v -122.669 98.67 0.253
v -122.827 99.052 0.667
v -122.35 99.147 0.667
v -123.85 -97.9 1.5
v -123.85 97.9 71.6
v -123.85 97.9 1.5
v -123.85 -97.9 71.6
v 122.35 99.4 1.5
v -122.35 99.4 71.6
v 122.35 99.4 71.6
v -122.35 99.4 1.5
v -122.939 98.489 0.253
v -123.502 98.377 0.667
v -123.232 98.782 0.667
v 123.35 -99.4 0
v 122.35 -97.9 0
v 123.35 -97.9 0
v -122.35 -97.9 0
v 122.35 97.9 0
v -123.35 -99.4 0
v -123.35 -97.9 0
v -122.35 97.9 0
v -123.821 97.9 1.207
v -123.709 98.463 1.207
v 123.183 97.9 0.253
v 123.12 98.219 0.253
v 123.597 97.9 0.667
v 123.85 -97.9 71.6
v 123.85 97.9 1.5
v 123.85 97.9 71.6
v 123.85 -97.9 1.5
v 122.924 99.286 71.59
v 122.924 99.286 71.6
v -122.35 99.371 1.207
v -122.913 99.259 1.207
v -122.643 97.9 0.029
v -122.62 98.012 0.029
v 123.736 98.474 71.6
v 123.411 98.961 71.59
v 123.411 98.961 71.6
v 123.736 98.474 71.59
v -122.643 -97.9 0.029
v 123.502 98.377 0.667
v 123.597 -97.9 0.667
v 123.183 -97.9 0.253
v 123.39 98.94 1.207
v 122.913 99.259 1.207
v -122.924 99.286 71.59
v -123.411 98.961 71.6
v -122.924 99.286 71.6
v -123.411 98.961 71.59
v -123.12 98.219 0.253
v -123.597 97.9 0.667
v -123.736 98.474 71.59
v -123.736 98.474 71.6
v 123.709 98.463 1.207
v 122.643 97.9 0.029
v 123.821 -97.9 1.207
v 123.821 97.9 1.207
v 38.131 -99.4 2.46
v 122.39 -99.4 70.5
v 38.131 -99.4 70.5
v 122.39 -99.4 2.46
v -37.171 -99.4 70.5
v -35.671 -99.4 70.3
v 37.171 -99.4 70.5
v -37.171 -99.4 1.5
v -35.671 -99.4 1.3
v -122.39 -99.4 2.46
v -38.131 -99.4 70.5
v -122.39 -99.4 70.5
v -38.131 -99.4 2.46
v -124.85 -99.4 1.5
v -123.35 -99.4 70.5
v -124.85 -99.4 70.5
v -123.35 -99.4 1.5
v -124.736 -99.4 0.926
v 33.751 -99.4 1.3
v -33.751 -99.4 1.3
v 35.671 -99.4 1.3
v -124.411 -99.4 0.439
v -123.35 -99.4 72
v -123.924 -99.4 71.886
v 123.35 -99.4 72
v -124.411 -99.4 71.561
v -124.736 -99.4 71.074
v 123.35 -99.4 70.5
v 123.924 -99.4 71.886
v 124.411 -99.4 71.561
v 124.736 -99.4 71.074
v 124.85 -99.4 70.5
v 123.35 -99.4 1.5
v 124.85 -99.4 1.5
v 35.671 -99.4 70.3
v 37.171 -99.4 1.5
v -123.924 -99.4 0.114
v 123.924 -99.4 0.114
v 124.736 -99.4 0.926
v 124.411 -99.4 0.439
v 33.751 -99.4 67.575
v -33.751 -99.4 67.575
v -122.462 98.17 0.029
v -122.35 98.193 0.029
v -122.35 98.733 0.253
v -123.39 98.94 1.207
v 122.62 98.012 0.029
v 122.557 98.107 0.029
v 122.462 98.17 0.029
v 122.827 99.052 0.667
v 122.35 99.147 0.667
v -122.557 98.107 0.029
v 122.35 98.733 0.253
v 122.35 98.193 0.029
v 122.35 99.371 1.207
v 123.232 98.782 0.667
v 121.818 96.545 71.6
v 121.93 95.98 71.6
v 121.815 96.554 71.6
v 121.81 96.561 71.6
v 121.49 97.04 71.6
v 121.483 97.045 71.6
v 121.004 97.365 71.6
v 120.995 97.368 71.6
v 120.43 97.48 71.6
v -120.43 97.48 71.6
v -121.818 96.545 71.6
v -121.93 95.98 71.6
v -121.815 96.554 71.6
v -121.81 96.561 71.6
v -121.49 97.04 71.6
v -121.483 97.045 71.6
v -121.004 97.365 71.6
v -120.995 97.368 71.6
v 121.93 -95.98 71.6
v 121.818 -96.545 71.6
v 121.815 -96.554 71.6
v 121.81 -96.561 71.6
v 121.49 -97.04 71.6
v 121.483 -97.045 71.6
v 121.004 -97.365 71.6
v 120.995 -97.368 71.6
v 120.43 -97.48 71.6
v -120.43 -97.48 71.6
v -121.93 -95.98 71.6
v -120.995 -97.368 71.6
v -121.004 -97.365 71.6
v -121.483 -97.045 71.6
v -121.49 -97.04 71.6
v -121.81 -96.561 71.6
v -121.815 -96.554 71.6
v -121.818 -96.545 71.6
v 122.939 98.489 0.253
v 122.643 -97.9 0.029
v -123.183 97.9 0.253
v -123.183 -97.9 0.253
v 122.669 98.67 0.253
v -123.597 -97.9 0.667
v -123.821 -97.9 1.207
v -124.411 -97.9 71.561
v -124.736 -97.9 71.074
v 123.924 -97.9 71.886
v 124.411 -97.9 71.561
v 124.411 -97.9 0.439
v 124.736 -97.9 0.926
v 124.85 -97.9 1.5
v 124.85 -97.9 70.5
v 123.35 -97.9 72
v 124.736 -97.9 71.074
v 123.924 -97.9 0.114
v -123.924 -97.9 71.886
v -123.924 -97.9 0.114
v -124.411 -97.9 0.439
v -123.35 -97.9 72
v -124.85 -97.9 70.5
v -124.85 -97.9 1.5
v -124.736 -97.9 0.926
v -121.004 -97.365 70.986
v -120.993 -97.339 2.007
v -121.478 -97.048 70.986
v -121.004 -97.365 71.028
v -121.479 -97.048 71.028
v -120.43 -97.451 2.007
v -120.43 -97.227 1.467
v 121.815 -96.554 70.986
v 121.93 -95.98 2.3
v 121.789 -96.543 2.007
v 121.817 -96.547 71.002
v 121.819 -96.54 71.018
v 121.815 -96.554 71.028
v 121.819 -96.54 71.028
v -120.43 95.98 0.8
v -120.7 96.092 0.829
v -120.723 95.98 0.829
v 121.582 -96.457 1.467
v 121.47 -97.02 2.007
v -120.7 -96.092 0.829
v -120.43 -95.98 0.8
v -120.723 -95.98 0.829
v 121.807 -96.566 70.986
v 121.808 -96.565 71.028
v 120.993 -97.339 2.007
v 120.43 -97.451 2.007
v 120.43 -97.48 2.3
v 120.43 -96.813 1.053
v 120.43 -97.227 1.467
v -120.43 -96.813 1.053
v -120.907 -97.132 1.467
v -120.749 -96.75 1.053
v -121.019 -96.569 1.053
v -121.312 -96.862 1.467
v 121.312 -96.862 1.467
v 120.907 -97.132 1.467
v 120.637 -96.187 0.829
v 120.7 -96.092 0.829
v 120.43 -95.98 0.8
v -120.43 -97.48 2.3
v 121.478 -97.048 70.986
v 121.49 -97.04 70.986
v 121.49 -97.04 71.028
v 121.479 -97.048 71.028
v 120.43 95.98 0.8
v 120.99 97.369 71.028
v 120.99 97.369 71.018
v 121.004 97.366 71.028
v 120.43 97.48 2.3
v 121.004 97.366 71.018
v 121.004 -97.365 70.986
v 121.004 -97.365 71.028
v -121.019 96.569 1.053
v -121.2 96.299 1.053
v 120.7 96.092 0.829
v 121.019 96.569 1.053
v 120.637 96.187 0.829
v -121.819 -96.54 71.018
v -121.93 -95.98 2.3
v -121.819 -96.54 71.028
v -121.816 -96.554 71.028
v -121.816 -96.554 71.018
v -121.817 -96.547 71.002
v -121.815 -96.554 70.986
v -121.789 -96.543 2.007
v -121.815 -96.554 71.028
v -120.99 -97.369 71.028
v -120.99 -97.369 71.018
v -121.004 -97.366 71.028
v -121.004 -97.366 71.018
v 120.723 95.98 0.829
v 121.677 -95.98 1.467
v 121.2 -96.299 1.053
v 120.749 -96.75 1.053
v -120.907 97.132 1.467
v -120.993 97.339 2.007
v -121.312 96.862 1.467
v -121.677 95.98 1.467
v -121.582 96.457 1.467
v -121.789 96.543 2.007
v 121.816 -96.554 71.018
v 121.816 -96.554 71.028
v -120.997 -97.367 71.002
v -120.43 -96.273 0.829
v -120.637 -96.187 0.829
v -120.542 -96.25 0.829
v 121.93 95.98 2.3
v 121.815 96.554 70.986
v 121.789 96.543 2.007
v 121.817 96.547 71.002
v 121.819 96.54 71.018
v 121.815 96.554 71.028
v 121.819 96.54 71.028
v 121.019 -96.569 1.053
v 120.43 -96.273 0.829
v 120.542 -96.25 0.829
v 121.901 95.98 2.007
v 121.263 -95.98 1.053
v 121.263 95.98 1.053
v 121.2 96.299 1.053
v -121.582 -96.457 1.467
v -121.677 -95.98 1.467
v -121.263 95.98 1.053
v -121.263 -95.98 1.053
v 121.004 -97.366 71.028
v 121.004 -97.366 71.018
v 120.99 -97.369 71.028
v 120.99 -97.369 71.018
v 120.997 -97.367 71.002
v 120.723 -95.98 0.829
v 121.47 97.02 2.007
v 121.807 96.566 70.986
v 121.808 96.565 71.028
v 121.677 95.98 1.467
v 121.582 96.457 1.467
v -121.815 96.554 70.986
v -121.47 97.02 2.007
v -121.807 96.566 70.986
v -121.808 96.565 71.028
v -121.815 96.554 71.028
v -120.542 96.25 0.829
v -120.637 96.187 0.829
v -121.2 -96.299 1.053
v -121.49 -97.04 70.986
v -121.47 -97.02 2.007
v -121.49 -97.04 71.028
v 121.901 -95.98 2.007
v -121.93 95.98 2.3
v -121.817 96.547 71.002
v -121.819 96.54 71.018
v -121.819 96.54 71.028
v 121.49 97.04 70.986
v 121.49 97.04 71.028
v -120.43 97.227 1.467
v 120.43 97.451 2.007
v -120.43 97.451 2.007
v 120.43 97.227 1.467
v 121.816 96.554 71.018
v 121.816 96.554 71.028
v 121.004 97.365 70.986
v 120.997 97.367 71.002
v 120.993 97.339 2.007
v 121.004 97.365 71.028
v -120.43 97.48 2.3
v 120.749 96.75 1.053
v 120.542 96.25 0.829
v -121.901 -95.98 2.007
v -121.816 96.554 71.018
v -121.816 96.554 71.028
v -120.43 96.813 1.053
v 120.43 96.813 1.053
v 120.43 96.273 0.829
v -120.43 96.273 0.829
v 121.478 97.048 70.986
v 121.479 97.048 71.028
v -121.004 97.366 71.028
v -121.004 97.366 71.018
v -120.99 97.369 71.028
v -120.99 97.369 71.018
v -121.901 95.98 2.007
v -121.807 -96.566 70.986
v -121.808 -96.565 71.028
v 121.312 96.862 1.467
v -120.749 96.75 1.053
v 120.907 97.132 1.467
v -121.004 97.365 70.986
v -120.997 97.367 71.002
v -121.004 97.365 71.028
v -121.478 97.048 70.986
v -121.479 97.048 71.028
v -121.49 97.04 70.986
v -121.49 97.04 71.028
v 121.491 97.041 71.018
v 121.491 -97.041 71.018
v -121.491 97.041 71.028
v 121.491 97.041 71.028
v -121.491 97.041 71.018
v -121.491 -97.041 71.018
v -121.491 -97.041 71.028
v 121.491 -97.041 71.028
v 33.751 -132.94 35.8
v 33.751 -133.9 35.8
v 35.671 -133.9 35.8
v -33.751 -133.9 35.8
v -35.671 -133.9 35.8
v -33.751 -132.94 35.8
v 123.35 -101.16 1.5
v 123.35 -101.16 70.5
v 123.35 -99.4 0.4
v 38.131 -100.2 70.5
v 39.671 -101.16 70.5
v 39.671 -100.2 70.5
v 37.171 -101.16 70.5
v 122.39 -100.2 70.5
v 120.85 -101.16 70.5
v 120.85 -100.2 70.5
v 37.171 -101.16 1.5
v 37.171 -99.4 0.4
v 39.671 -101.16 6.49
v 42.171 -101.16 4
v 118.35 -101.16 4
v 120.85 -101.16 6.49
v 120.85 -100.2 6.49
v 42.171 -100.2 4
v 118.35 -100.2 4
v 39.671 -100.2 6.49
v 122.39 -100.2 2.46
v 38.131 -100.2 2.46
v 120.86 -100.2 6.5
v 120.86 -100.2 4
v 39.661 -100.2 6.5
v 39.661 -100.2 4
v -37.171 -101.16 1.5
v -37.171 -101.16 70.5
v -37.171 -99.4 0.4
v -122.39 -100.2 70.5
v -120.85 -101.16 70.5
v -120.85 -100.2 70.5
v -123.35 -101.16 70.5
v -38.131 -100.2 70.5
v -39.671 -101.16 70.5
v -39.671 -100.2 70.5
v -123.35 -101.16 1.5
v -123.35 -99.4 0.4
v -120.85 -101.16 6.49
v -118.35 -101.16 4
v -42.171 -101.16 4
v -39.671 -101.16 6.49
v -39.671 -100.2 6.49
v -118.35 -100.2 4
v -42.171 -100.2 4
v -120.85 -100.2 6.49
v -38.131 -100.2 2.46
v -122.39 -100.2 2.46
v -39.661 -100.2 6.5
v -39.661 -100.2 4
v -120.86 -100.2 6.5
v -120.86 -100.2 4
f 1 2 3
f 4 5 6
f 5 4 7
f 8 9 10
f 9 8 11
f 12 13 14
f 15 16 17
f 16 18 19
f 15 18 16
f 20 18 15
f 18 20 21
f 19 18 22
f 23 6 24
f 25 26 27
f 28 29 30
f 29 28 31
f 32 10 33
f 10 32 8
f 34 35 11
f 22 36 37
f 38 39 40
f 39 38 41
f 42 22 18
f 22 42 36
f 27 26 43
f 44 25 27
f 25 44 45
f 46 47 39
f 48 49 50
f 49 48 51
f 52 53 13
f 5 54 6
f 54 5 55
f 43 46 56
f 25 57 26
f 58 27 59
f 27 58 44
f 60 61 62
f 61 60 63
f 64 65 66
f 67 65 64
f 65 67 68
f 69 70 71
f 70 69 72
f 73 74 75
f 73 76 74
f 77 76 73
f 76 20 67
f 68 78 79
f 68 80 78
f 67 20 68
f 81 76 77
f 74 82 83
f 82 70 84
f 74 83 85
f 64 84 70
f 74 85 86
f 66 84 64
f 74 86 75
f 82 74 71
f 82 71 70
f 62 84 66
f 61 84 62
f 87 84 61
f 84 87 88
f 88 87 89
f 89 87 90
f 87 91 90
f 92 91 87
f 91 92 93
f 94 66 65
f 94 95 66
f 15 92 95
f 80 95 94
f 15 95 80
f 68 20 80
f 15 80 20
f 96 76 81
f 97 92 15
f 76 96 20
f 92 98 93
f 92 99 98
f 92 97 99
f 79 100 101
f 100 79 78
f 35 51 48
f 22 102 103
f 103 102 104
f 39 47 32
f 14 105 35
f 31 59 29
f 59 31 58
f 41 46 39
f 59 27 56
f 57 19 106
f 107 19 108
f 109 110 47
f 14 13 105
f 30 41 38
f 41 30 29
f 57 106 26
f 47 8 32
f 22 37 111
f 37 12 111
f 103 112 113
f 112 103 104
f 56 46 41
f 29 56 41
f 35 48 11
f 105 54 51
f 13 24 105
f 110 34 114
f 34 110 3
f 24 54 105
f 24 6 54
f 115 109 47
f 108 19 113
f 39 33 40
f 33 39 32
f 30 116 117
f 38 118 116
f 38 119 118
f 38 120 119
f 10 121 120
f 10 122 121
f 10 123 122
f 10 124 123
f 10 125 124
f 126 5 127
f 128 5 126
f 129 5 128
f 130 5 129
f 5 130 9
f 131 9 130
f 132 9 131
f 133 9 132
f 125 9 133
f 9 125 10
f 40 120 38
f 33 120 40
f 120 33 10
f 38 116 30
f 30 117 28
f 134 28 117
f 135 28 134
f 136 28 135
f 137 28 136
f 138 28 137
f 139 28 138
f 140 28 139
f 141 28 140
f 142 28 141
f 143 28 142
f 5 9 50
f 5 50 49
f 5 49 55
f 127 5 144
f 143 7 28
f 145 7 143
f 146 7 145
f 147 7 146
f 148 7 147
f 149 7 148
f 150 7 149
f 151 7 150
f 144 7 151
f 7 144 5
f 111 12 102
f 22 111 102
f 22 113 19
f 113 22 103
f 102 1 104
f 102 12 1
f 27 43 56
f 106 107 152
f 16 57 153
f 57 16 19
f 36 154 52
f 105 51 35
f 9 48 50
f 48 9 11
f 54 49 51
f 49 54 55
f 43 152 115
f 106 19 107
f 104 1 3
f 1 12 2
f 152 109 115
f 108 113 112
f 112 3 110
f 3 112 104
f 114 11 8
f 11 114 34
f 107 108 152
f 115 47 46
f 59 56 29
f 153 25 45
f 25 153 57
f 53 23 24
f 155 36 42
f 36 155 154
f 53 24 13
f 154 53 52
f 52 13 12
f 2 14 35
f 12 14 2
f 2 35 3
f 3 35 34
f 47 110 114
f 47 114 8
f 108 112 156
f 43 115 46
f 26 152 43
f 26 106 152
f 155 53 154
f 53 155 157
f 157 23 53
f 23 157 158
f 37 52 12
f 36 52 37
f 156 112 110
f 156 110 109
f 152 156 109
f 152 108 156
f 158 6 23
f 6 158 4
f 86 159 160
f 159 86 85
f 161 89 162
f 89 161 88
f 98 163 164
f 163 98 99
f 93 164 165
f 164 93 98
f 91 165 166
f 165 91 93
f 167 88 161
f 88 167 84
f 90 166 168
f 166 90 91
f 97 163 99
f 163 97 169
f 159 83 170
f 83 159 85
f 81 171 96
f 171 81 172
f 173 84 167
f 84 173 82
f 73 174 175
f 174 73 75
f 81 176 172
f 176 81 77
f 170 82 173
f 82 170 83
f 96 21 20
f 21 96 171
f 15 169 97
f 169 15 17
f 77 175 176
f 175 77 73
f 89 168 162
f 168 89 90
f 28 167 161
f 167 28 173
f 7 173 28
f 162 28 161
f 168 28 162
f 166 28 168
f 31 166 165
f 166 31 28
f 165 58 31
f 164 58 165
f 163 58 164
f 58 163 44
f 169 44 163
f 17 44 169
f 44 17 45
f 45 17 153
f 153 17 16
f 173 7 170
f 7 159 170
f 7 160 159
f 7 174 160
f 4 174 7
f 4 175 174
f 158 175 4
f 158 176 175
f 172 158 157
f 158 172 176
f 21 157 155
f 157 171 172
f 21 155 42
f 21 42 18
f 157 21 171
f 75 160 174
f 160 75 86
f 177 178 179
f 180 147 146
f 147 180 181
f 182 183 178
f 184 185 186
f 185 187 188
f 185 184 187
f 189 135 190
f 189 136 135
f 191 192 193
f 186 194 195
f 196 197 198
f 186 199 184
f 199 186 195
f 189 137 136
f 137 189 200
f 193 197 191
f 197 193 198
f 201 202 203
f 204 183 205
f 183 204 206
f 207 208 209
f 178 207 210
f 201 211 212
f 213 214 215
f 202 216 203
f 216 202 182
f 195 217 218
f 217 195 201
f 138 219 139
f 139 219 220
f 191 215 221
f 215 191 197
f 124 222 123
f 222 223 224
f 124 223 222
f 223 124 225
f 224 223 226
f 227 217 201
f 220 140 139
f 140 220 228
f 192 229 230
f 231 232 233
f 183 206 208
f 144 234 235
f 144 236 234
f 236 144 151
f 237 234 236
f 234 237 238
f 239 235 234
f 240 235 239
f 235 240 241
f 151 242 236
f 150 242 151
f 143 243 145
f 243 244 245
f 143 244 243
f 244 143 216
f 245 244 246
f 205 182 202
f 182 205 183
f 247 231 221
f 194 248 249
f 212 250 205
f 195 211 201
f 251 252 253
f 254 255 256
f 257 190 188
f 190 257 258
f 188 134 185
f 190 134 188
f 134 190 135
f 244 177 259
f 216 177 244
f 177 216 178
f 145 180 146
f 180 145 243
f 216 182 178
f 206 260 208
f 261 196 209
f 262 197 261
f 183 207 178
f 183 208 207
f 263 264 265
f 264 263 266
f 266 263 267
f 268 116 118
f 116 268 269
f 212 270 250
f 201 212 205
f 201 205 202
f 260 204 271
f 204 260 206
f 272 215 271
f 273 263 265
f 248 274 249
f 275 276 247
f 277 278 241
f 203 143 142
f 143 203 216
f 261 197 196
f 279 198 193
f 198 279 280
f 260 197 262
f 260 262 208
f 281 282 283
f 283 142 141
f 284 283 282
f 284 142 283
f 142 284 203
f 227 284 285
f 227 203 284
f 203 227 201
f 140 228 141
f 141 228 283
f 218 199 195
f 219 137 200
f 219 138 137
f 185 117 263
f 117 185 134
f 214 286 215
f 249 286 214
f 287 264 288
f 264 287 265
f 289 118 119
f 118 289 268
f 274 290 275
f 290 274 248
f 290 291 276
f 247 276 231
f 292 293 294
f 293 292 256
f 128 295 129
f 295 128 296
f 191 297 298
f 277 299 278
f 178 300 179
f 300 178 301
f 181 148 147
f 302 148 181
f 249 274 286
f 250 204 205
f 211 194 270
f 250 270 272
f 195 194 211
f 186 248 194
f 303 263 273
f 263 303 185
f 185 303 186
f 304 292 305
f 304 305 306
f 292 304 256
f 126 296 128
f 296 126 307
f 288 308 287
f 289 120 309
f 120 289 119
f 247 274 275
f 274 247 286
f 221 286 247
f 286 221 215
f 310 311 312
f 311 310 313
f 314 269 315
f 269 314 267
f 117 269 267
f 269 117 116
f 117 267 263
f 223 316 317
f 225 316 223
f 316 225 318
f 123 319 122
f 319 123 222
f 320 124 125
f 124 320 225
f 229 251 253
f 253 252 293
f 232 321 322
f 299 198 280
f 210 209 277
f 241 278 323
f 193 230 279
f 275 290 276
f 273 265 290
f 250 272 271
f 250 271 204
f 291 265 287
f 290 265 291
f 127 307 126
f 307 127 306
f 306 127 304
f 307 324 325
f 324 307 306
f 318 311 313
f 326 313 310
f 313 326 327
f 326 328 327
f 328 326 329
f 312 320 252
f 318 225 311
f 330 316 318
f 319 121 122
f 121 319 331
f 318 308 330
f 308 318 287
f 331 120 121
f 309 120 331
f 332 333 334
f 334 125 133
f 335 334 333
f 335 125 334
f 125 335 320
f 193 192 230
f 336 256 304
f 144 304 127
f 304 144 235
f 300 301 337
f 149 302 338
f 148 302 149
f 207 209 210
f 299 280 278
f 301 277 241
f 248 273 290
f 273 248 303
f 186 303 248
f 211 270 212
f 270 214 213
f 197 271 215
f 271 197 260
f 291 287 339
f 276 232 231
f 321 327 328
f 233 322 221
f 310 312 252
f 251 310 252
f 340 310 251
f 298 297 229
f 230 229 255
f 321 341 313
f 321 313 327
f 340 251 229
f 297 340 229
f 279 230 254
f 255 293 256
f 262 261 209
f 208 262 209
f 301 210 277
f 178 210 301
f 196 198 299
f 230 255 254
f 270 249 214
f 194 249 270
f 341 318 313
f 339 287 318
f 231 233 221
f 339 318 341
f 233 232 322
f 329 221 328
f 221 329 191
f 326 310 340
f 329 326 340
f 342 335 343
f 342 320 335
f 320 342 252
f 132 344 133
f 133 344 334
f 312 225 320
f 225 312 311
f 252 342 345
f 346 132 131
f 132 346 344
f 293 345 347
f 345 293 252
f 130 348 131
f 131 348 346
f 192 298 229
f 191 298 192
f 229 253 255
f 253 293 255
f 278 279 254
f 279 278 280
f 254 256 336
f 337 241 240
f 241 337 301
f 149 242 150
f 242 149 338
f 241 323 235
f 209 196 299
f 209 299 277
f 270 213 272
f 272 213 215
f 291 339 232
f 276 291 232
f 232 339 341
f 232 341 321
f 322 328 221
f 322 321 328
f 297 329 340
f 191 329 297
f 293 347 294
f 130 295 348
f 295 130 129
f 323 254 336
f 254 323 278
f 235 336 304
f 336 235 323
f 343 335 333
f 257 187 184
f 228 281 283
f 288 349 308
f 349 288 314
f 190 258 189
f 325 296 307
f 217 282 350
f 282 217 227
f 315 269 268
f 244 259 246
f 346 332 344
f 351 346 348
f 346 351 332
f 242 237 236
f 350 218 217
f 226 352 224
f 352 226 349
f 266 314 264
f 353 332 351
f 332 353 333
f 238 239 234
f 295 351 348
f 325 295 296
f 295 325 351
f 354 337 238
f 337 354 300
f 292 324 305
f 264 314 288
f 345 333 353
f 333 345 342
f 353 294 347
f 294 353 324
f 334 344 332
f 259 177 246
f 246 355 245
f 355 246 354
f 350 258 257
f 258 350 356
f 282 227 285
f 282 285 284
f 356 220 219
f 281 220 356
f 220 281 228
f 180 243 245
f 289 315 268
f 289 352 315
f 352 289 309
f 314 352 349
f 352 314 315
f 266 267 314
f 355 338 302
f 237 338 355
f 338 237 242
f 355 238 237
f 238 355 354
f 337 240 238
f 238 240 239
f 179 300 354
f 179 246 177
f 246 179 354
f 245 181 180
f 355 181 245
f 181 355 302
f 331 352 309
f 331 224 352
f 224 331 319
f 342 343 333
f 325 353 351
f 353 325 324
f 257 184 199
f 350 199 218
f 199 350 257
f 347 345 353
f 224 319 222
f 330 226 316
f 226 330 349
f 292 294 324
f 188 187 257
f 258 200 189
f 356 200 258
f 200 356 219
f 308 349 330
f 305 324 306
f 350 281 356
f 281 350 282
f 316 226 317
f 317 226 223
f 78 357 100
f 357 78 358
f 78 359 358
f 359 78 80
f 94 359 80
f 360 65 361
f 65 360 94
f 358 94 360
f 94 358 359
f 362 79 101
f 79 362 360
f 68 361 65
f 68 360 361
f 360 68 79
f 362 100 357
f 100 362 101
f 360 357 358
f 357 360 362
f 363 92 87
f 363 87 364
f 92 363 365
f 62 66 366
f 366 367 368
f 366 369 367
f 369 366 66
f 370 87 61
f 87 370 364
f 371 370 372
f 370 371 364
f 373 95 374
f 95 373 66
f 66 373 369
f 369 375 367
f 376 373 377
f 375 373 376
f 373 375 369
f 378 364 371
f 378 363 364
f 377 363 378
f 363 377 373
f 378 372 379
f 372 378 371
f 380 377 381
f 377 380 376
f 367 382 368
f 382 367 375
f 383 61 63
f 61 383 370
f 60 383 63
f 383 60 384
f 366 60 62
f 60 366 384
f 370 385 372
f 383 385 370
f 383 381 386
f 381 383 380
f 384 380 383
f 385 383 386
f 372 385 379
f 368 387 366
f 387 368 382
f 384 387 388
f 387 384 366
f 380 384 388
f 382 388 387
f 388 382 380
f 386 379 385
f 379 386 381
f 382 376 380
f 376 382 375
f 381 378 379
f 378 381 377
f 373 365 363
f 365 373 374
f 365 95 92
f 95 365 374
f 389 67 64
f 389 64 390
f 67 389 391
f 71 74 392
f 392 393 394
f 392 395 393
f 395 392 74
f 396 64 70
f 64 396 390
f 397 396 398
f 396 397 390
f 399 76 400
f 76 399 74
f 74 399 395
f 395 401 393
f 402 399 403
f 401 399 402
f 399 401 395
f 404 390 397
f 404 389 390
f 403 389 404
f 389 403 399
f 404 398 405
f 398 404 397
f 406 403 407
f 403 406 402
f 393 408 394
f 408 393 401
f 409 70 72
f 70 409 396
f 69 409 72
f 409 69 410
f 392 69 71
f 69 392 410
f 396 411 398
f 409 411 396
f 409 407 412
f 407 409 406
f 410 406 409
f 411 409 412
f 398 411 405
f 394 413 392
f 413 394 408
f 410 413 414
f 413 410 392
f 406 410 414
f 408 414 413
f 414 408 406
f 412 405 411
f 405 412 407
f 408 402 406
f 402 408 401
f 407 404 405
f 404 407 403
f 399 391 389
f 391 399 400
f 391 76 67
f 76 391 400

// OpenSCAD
//STACKABLE RESISTOR STORAGE BOX [Customizable]
//Created by Bram Vaessen 2018

// preview[view:south, tilt:top diagonal]

// Which one would you like to see?
// part = "middleMiddle";
part = "customDrawer";
// part = "info";
// part = "customDrawer"; //[single:Single Box <no stacking>), drawer: Drawer, customDrawer: Custom Drawer, topLeft:Box Top Left, topMiddle:Box Top Middle, topRight:Box Top Right, middleLeft:Box Middle Left, middleMiddle:Box Middle Middle, middleRight:Box Middle right, bottomLeft:Box Bottom Left, bottomMiddle:Box Bottom Middle, bottomRight:Box Bottom Right,  topSC:Box Top <Single Column Stacking>, middleSC:Box Middle <Signle Column Stacking>, bottomSC:Box Bottom <Signle Column Stacking>, leftSR:Box Left <Single Row Stacking>, middleSR:Box Middle <Single Row Stacking>, rightSR:Box Right <Single Row Stacking>, connector:Connector <for stacking>, info:INFO <Show Box/Drawer/Label sizes>]


/* [Basic Setup] */
//The width (mm) of a single compartment in a drawer (ignored with 'Custom Sized Box')
compartWidth = 25;
//The depth (mm) of a single compartment in a drawer (ignored with 'Custom Sized Box')
compartDepth = 62;
//The height (mm) of a single compartment in a drawer (ignored with 'Custom Sized Box')
compartHeight = 34-.2;

//The number of compartments in the drawer next to each other
compartXCount = 2;
//The numberof compartments in the drawer behind each other
compartYCount = 2;

//The number of drawers on top of each other
drawRows = 3;
//The number of columns of drawers next to eachother
drawCols = 1;

//The style of the handle on the drawers
handleStyle = 0; //[0:Normal, 1:Thin Handle]

//Add holes to the back of the box for mounting it on a wall or panel?
mountHoles=0; //[0:No, 1:Yes]


/* [Custom Drawer] */
//The number of compartments in the drawer next to each other (custom drawer)
cdrawXCount=1;
//The number of compartments in the drawer behind each other (custom drawer)
cdrawYCount=1;

/* [Custom Sized Box] */
//Provide a custom size for the box? Overrides/ignores compartment size!
useCustomBox = 1; //[0:No, 1:Yes]
//the width (mm) of the box
customBoxWidth = 255;
//the depth (mm) of the box
customBoxDepth = 200;
//the height (mm) of the box
customBoxHeight = 75 * 3;

/* [Tolerances] */
//the amount of extra space (mm) on the side of the drawers, on each side (reprint box after changing, unless using 'custom sized box', then reprint drawer)
drawHorSpace = 0.25;
//the amount of extra space (mm) on top and bottom of drawers, on each side (reprint box after changing, unless using 'custom sized box', then reprint drawer)
drawVertSpace = 0.35;
//the amount of extra space (mm) on the behind the drawer (reprint box after changing, unless using 'custom sized box', then reprint drawer)
drawBackSpace = 0.2;
//the amount  (mm) to shrink the drawer in height and width to fit more easily (reprint drawer after changing). TOLERANT drawers use 0.2mm.
drawShrink = 0.0;


/* [Your Printer Settings] */
//the layer width that you print with (0.48 is normal for 0.4 nozzle)
layerWidth=0.48;
//the layer height that you print with 
layerHeight=0.2;


///////////////////////////////////////////////////


/* [Hidden] */
grooveHeight = 5;
grooveDepth = 1* layerWidth;
smoothRadius=1.5;
smoothQuality=16;

boxColumnSpace = layerWidth*2;

drawDividerWidth = 2*layerWidth;
drawOutsideWidth = 4*layerWidth;
drawBottomHeight = 4*layerHeight;

drawFrontExtraWidth=1;
drawFrontExtraHeight = 2*layerHeight;

drawFrontExtra = max(0, smoothRadius - drawOutsideWidth);

boxOutsideWidth = 5*layerWidth;
boxDividerWidth = 2*layerWidth;
boxBackDepth = (mountHoles==1)?CorrectedHeight(3):CorrectedHeight(1);


//if custom box size, reverse calculations
customBoxColumnWidth = (customBoxWidth +boxOutsideWidth*(drawCols-1) -  boxOutsideWidth + boxDividerWidth)/drawCols;
customBoxDrawSpaceX = customBoxColumnWidth - drawFrontExtraWidth*2 - boxOutsideWidth - boxColumnSpace;

customBoxDrawSpaceY = customBoxDepth - boxBackDepth - drawFrontExtra;
customBoxDrawSpaceZ = (customBoxHeight - boxOutsideWidth*2)/drawRows - boxDividerWidth;

customDrawWidth = customBoxDrawSpaceX - drawHorSpace*2;
customDrawDepth = customBoxDrawSpaceY - drawBackSpace;
customDrawHeight = customBoxDrawSpaceZ - drawVertSpace*2;

customCompartWidth = (customDrawWidth - drawOutsideWidth*2 - drawDividerWidth*(compartXCount-1)) / compartXCount;
customCompartDepth = (customDrawDepth - drawOutsideWidth*2 -drawDividerWidth*(compartYCount-1))/compartYCount;
customCompartHeight = customDrawHeight-drawBottomHeight;

compartWidthF = useCustomBox ? customCompartWidth : compartWidth;
compartDepthF = useCustomBox ? customCompartDepth : compartDepth;
compartHeightF = useCustomBox ? customCompartHeight : compartHeight;


drawWidth = drawOutsideWidth*2 + drawDividerWidth*(compartXCount-1) + compartWidthF*compartXCount;
drawDepth = drawOutsideWidth*2 + drawDividerWidth*(compartYCount-1) + compartDepthF*compartYCount;

//check differences between desired drawer height and corrected drawer height and add to spacer
drawHeight = CorrectedHeightDown(drawBottomHeight + compartHeightF);
drawHeightU = drawBottomHeight + compartHeightF;
drawHeightD = (drawHeightU - drawHeight) / 2;
drawVertSpaceC = drawVertSpace+drawHeightD;




boxDrawSpaceX = drawWidth + drawHorSpace*2;
boxDrawSpaceY = drawDepth + drawBackSpace;
boxDrawSpaceZ = drawHeight + drawVertSpaceC*2;

boxColumnWidth = boxDrawSpaceX + drawFrontExtraWidth*2 + boxOutsideWidth + boxColumnSpace;

boxWidth = boxColumnWidth * drawCols - boxOutsideWidth*(drawCols-1) + boxOutsideWidth - boxDividerWidth;
boxDepth = CorrectedHeight(boxBackDepth + boxDrawSpaceY + drawFrontExtra);
boxHeight = drawRows*(boxDrawSpaceZ + boxDividerWidth)+ boxOutsideWidth*2;




////



drawFrontWidth = drawWidth + drawFrontExtraWidth*2;
drawFrontHeight = drawHeight + drawFrontExtraHeight;

handleWidth = lerp(max(15,drawFrontWidth/3.5), drawFrontWidth/12, handleStyle);
handleHeight1 = min(drawFrontHeight - smoothRadius*2,handleWidth) ;
handleHeight2 = drawFrontHeight - smoothRadius*2;
handleHeight = handleStyle ? handleHeight2 : handleHeight1;


handleDepth = handleHeight*0.5;
handleThickness = layerWidth*4;

labelFrameWidth = (drawFrontWidth - handleWidth - smoothRadius*4)/2;
labelFrameHeight = drawFrontHeight - smoothRadius*2;
labelFrameDist = -drawFrontWidth / 2 + smoothRadius + labelFrameWidth/2;
labelFrameThickness = 2*layerWidth;
labelFrameEdgeSize = 2.5;
labelFrameSpace = 0.8;
labelFrameDepth = labelFrameThickness+labelFrameSpace;

connectorWidth = 4;
connectorMid = 3* layerHeight;
connectorSide = 5*layerHeight;
connectorLength = boxDepth/3*2;
connectorSpacer = 0.35;
connectorDist = 0.5/5*3.25;

stopperDepth = CorrectedHeight(1.5);
stopperSteps = stopperDepth / layerHeight;
stopperHeight = layerWidth*stopperSteps*0.8;
stopperWidth = stopperHeight*1.5;
stopperStart = 2;



mountholeSize1=4;
mountholeSize2=8;
mountholeDepth1 = 2.5;
mountholeDepth2 = 5;

print_part();

module print_part()
{
	if (part == "single") 
        rotate([-90,0,0]) Box();
    if (part == "drawer") 
        Drawer();
    if (part == "customDrawer")
        CustomDrawer();
    if (part == "topLeft") 
        rotate([-90,0,0]) Box(boxRight="connector", boxBottom="connector");
    if (part == "topMiddle") 
        rotate([-90,0,0]) 
            Box(boxLeft="connector", boxRight="connector", boxBottom="connector");
    if (part == "topRight") 
        rotate([-90,0,0]) Box(boxLeft="connector", boxBottom="connector");
    if (part == "middleLeft") 
        rotate([-90,0,0]) 
            Box(boxRight="connector", boxBottom="connector", boxTop="connector");
    if (part == "middleMiddle") 
        rotate([-90,0,0]) 
            Box(boxLeft="connector", boxRight="connector", 
                boxBottom="connector", boxTop="connector");
    if (part == "middleRight") 
        rotate([-90,0,0]) 
            Box(boxLeft="connector", boxBottom="connector", boxTop="connector");
    if (part == "bottomLeft") 
        rotate([-90,0,0]) Box(boxRight="connector", boxTop="connector");
    if (part == "bottomMiddle") 
        rotate([-90,0,0]) 
            Box(boxLeft="connector", boxRight="connector", boxTop="connector");
    if (part == "bottomRight") 
        rotate([-90,0,0]) 
            Box(boxLeft="connector", boxTop="connector");
    if (part == "topSC")
        rotate([-90,0,0]) Box(boxBottom="connector");
    if (part == "middleSC")
        rotate([-90,0,0]) Box(boxBottom="connector", boxTop="connector");
    if (part == "bottomSC")
        rotate([-90,0,0]) Box(boxTop="connector");
    if (part == "leftSR")
        rotate([-90,0,0]) Box(boxRight="connector");
    if (part == "middleSR")
        rotate([-90,0,0]) Box(boxLeft="connector", boxRight="connector");
    if (part == "rightSR")
        rotate([-90,0,0]) Box(boxLeft="connector");
    if (part == "connector")
        rotate([-90,0,0]) Connector();
    if (part == "info")
        Info();
}      


module Info()
{
    
    linear_extrude(height=0.2) union()
    {
        text(str("Box Size (mm): ",boxWidth, ", ",boxDepth,", ", boxHeight));
        translate([0,-20,0])
            text(str("Drawer Size (mm): ", drawWidth,", ", drawDepth,", ",drawHeight));
        translate([0,-40,0])
            text(str("Label Size (mm): ", labelFrameWidth-labelFrameThickness*2-1,", ", labelFrameHeight-labelFrameThickness-1));
        translate([0,-60,0])
            text(str("Compartment Size (mm): ", compartWidthF,", ", compartDepthF,", ",compartHeightF));
        
    }
}


module Connector()
{
    linear_extrude(height=connectorLength-5)
        polygon(points=[
            [-connectorWidth/2+connectorSpacer, -connectorMid],
            [-connectorWidth/2+connectorSpacer, connectorMid],
            [-connectorWidth/2 -connectorSide +connectorSpacer, connectorMid+connectorSide],
            [connectorWidth/2 + connectorSide -connectorSpacer, connectorMid+connectorSide],
            [connectorWidth/2 - connectorSpacer,  connectorMid],
            [connectorWidth/2 - connectorSpacer, -connectorMid],
            [connectorWidth/2 + connectorSide - connectorSpacer, -connectorMid-connectorSide],
            [-connectorWidth/2 - connectorSide + connectorSpacer, -connectorMid-connectorSide],
            ]);
    
        translate([0,0,connectorLength-5])
        linear_extrude(height=5, scale=[0.75, 1])
        polygon(points=[
            [-connectorWidth/2+connectorSpacer, -connectorMid],
            [-connectorWidth/2+connectorSpacer, connectorMid],
            [-connectorWidth/2 -connectorSide +connectorSpacer, connectorMid+connectorSide],
            [connectorWidth/2 + connectorSide -connectorSpacer, connectorMid+connectorSide],
            [connectorWidth/2 - connectorSpacer,  connectorMid],
            [connectorWidth/2 - connectorSpacer, -connectorMid],
            [connectorWidth/2 + connectorSide - connectorSpacer, -connectorMid-connectorSide],
            [-connectorWidth/2 - connectorSide + connectorSpacer, -connectorMid-connectorSide],
            ]);
            
        for (z=[6,connectorLength-6])

        translate([0,0,z])
            linear_extrude(height=1)
                polygon(points=[
                    [-connectorWidth/2+connectorSpacer, -connectorMid],
                    [-connectorWidth/2+connectorSpacer, connectorMid],
                    [-connectorWidth/2 -connectorSide+connectorSpacer/2, connectorMid+connectorSide],
                    [connectorWidth/2 + connectorSide-connectorSpacer/2 , connectorMid+connectorSide],
                    [connectorWidth/2 - connectorSpacer,  connectorMid],
                    [connectorWidth/2 - connectorSpacer, -connectorMid],
                    [connectorWidth/2 + connectorSide -connectorSpacer/2, -connectorMid-connectorSide],
                    [-connectorWidth/2 - connectorSide +connectorSpacer/2, -connectorMid-connectorSide],
                    ]); 
}

module MountHole()
{
    translate([0,-0.01,0]) 
    rotate([-90,0,0]) 
    {
        cylinder(d=mountholeSize2, d2=mountholeSize1, h = mountholeDepth1, $fn=32);
        translate([0,0,mountholeDepth1])
            cylinder(d=mountholeSize1, h=mountholeDepth2, $fn=32);
    }
}

function CorrectedHeight(height) = ceil(height/layerHeight)*layerHeight;
function CorrectedHeightDown(height) = floor(height/layerHeight)*layerHeight;    

module ConnectorCutout()
{
    
    len = connectorLength + 2;
    linear_extrude(height=len) 
        polygon(points=[
            [-connectorWidth/2, -connectorMid],
            [-connectorWidth/2, connectorMid],
            [-connectorWidth/2 -connectorSide, connectorMid+connectorSide],
            [connectorWidth/2 + connectorSide, connectorMid+connectorSide],
            [connectorWidth/2,  connectorMid],
            [connectorWidth/2, -connectorMid],
            [connectorWidth/2 + connectorSide, -connectorMid-connectorSide],
            [-connectorWidth/2 - connectorSide, -connectorMid-connectorSide],
            ]);
    
        scale([2,1.25,1])
        linear_extrude(height=5, scale=[.5, 1/1.25]) 
        polygon(points=[
            [-connectorWidth/2, -connectorMid],
            [-connectorWidth/2, connectorMid],
            [-connectorWidth/2 -connectorSide, connectorMid+connectorSide],
            [connectorWidth/2 + connectorSide, connectorMid+connectorSide],
            [connectorWidth/2,  connectorMid],
            [connectorWidth/2, -connectorMid],
            [connectorWidth/2 + connectorSide, -connectorMid-connectorSide],
            [-connectorWidth/2 - connectorSide, -connectorMid-connectorSide],
            ]);
    
}
//!Grooves(100,100);

module Grooves(width,height)
{
    areaHeight = height*0.85;
    areaWidth = width*0.95;
    holeHeight = .75* grooveHeight;
    h = grooveHeight + holeHeight;
    count = ceil((areaHeight+holeHeight)/h);
    space = (areaHeight - count*grooveHeight) / (count-1);
    startZ = -areaHeight/2 + grooveHeight/2;
    stepZ = space+grooveHeight;
        
    for (z=[0:count-1]) translate([0,0,startZ + z*stepZ])
    {
        hull()
        {
            for (x=[-1,1]) translate([x*(areaWidth/2 - grooveHeight),0,0])
                rotate([90,0,0])
                    cylinder(d=grooveHeight, h=grooveDepth, center=true, $fn=32);

            for (x=[-1,1]) translate([x*(areaWidth/2 - grooveHeight),0,0])
                rotate([90,0,0])
                    cylinder(d=grooveHeight-grooveDepth*2, h=grooveDepth*2, center=true, $fn=32);
        }
        
    }
}    

module Box(boxLeft="grooves", boxRight="grooves", boxTop="solid", boxBottom="solid")
{
    startX = -boxWidth/2 + boxOutsideWidth + drawFrontExtraWidth+ boxDrawSpaceX/2;
    stepX = boxColumnWidth - boxOutsideWidth;
    startZ = boxOutsideWidth;
    stepZ = boxDrawSpaceZ + boxDividerWidth;
    y= -boxBackDepth - boxDrawSpaceY/2;
    frontPanelWidth = boxDrawSpaceX+drawFrontExtraWidth*2;
    fontPanelHeight = drawRows*(boxDrawSpaceZ+boxDividerWidth);
    stopperY = CorrectedHeight(-boxDepth + smoothRadius + stopperStart);
    frontPanelInset = smoothRadius + drawFrontExtra + labelFrameDepth;
    stopperDist = drawWidth /2 -drawOutsideWidth - stopperWidth;
    insideCutWidth = (stopperDist -stopperWidth) * 2;
    insideCutHeight = stepZ * drawRows - smoothRadius*2;
    difference()
    {
        //main body of the box
        translate([0,0,boxHeight/2]) rotate([90,0,0])
            SmoothCube2([boxWidth, boxHeight, boxDepth]);
        
        //for each column
        for (x=[0:drawCols-1])
        {
            //cut out the drawer parts
            for (z=[0:drawRows-1])
                translate([startX+x*stepX,y-1,startZ + z*stepZ])
                    SmoothCube([boxDrawSpaceX, boxDrawSpaceY+2, boxDrawSpaceZ]);
            //cut out front part
            translate([startX+x*stepX,,-boxDepth-1,boxOutsideWidth+fontPanelHeight/2]) 
                SmoothPanel([frontPanelWidth, CorrectedHeight(frontPanelInset)+1, fontPanelHeight]);
        
            //cut out inside
            translate([startX+x*stepX, -boxBackDepth-smoothRadius,boxOutsideWidth]) 
                YMinCube([insideCutWidth, boxDepth, insideCutHeight]);
            
            //cutout mounting holes
            if (mountHoles)
            {
                for (x2=[-1,1])
                    translate([startX+x*stepX + x2*(boxDrawSpaceX/2-mountholeSize2*1.5), 
                           -boxBackDepth,
                           startZ + (drawRows-0.5)*stepZ])
                        MountHole();
                
                translate([startX+x*stepX, 
                           -boxBackDepth,
                           startZ + 0.5*stepZ])
                        MountHole();
            }
                
                
        }
        
        //add stuff like connectors
        if (boxLeft=="connector")
            for (z=[-1,1]) translate([-boxWidth/2, 0.0001, boxHeight/2 + z*boxHeight*connectorDist])
                rotate([90,90,0]) ConnectorCutout();
        else if (boxLeft=="grooves")
            translate([-boxWidth/2, -boxDepth/2, boxHeight/2])
                rotate([0,0,90]) Grooves(boxDepth-smoothRadius/2, boxHeight-smoothRadius/2);
        
        if (boxRight=="connector")
            for (z=[-1,1]) translate([boxWidth/2, 0.0001, boxHeight/2 + z*boxHeight*connectorDist])
                rotate([90,90,0]) ConnectorCutout();
        else if (boxRight=="grooves")
            translate([boxWidth/2, -boxDepth/2, boxHeight/2])
                rotate([0,0,90]) Grooves(boxDepth-smoothRadius/2, boxHeight-smoothRadius/2);
        
        if (boxBottom=="connector")
            for (x=[-1,1]) translate([x*boxWidth*connectorDist, 0.0001, 0])
                rotate([90,0,0]) ConnectorCutout();
        
        if (boxTop=="connector")
            for (x=[-1,1]) translate([x*boxWidth*connectorDist, 0.0001, boxHeight])
                rotate([90,0,0]) ConnectorCutout();
            
        
        
    }
    
    //add stoppers
    for (x=[0:drawCols-1]) for (z=[0:drawRows-1]) for (x2=[-1,1])
        translate([startX+x*stepX + x2*stopperDist,
                   stopperY,
                   startZ + z*stepZ + boxDrawSpaceZ])
            Stopper();
            
        
    
    //*for (x=[0:drawCols-1]) for (z=[0:drawRows-1])
    //    translate([startX+x*stepX,y - drawBackSpace/2 ,startZ + drawVertSpace + z*stepZ])
    //        Drawer();
    
}

module CustomDrawer()
{
    y = -drawDepth/2 + drawFrontExtra;
    z = drawHeight/2;
    

    indentWidth = drawWidth - drawOutsideWidth*2;
    indentDepth = drawDepth - drawOutsideWidth*2;
    
    ccompWidth = (indentWidth - (cdrawXCount-1)*drawDividerWidth) / cdrawXCount;
    ccompDepth = (indentDepth - (cdrawYCount-1)*drawDividerWidth) / cdrawYCount;
    
    startX = -drawWidth/2 + drawOutsideWidth + ccompWidth/2;
    startY = -drawDepth/2 + drawOutsideWidth + ccompDepth/2;
    stepX = ccompWidth + drawDividerWidth;
    stepY = ccompDepth + drawDividerWidth;
    
    difference()
    {
        DrawerBase();
        //cut out compartments
        for (x=[0:cdrawXCount-1]) for (y=[0:cdrawYCount-1])
            translate([startX + x*stepX, startY + y*stepY, drawBottomHeight])
                SmoothCube([ccompWidth, ccompDepth, compartHeightF+1]);
        //top indent for dividers
        translate([0,0,drawHeight-stopperHeight]) 
            SmoothCube([indentWidth, indentDepth, smoothRadius+1]);
    }
        
    if (handleStyle==0)
        translate([0,y,z]) Handle();
    if (handleStyle==1)
        translate([0,y,0]) HandleThin();
    for (x=[-1,1])
        translate([x*labelFrameDist,y,smoothRadius]) LabelFrame();
    
    
}

module Drawer()
{
    y = -drawDepth/2 + drawFrontExtra;
    z = drawHeight/2;
    
    echo(drawHeight);
    
    startX = -drawWidth/2 + drawOutsideWidth + compartWidthF/2;
    startY = -drawDepth/2 + drawOutsideWidth + compartDepthF/2;
    stepX = compartWidthF + drawDividerWidth;
    stepY = compartDepthF + drawDividerWidth;
    indentWidth = drawWidth - drawOutsideWidth*2;
    indentDepth = drawDepth - drawOutsideWidth*2;
    
    
    difference()
    {
        DrawerBase();
        //cut out compartments
        for (x=[0:compartXCount-1]) for (y=[0:compartYCount-1])
            translate([startX + x*stepX, startY + y*stepY, drawBottomHeight])
                SmoothCube([compartWidthF, compartDepthF, compartHeightF+2]);
        //top indent for dividers
        translate([0,0,drawHeight-stopperHeight]) 
            SmoothCube([indentWidth, indentDepth, smoothRadius+1]);
    }
        
    if (handleStyle==0)
        translate([0,y,z]) Handle();
    if (handleStyle==1)
        translate([0,y,0]) HandleThin();
    for (x=[-1,1])
        translate([x*labelFrameDist,y,smoothRadius]) LabelFrame();
    
    
}


module DrawerBase()
{
    translate([0,-drawFrontExtra/2,0])
                SmoothCube([drawWidth-drawShrink, drawDepth+drawFrontExtra, drawHeight-drawShrink]);
                //the front panel
            translate([0, -drawDepth/2 -drawFrontExtra , drawHeight/2+drawFrontExtraHeight/2])
                SmoothPanel([drawFrontWidth, smoothRadius, drawFrontHeight]);                
}



module Handle()
{
    for (x=[0,1]) mirror([x,0,0]) 
        translate([handleWidth/2-handleThickness,0]) rotate([90,0,90])
            linear_extrude(height=handleThickness)
            polygon(points=[[.01,-handleHeight/2-.01], [-handleDepth,0],[.01,handleHeight/2+.01]]);
    
    a = atan(handleDepth / (handleHeight/2));
    a2 = 90-a;
    
    d = handleThickness / sin(a);
    d2 = handleThickness / sin(a2);
    

    
    rotate([90,0,90])
        linear_extrude(height=handleWidth-0.01, center=true)
            polygon(points=[[-handleDepth,0],[.01,handleHeight/2+.01],[.01,handleHeight/2-d],
                         [-handleDepth+layerWidth*2,0]]); 
}

//!HandleThin(5);


module HandleThin()
{
    startDiam = handleWidth;
    endDiam = 0.85 * handleWidth;
    middleDiam = 0.4 * handleWidth;
    length = 2 * handleWidth;
    height = handleHeight - endDiam/3;

    difference()
    {
        cylinder(d=startDiam, h=height, $fn=32);
        translate([0,handleWidth+.01,0]) 
            cube([handleWidth*2, handleWidth*2, height*2.1], center=true);
    }
    difference()
    {
        union()
        {
            translate([0,-length,0]) cylinder(d=endDiam, h=height, $fn=32);
            translate([0,-length/2,0]) CenterCube([middleDiam, length,height]);
        }
        translate([0,-length-endDiam/2-handleWidth*.5,0]) rotate([45,0,0])
            cube([height,height,height*1.5], center=true);
    }
   
    translate([0,-length,height]) sphere(d=endDiam, $fn=32);
     
}
    


module LabelFrame()
{
    depth = labelFrameThickness + labelFrameSpace;
    
    difference()
    {
        translate([0,-depth/2+.01,0])
            CenterCube([labelFrameWidth, depth+.02, labelFrameHeight]);
        translate([0,0,labelFrameEdgeSize])
            CenterCube([labelFrameWidth-2*labelFrameEdgeSize, depth*3, labelFrameHeight]);
        translate([0,0,labelFrameThickness])
            CenterCube([labelFrameWidth-labelFrameThickness*2, labelFrameSpace*2, labelFrameHeight]);  

        
    }
    
    for (x=[0,1]) mirror([x,0,0]) 
    translate([0,-labelFrameSpace,0]) rotate([90,0,0]) linear_extrude(height=labelFrameThickness)
        polygon(points=[[-labelFrameWidth/2+labelFrameEdgeSize-0.01, labelFrameEdgeSize*2],
                        [-labelFrameWidth/2+labelFrameEdgeSize*2, labelFrameEdgeSize],
                        [-labelFrameWidth/2+labelFrameEdgeSize-0.01, labelFrameEdgeSize]]);
    
    ratio = layerHeight/ layerWidth;
    
    rotate([90,0,-90]) linear_extrude(height =labelFrameWidth, center=true) 
        polygon(points=[[0,0],[depth,0], [0,-depth*ratio*1.5]]);
}



module Stopper()
{
    for (i=[1:stopperSteps])
        translate([0,stopperDepth-(i-1)*layerHeight, 0]) rotate([90,0,0])
            linear_extrude(height=layerHeight)
                polygon(points=[[-stopperWidth*(i/stopperSteps),0],
                                [-stopperWidth/2*(i/stopperSteps),-stopperHeight*(i/stopperSteps)],
                                [stopperWidth/2*(i/stopperSteps),-stopperHeight*(i/stopperSteps)],
                                [stopperWidth*(i/stopperSteps),0]]);
    
}  

module CenterCube(size)
{
    translate([0,0,size[2]/2]) 
        cube(size=size,center=true);
}

module YMinCube(size)
{
    translate([0,-size[1]/2,0]) CenterCube(size);
}

module SmoothCube(size)
{
    sr2 = smoothRadius*2;
    hull()
    {
        
        translate([0,0,size[2]/2])
        {
            cube([size[0], size[1]-sr2, size[2]-sr2], center=true);
            cube([size[0]-sr2, size[1], size[2]-sr2], center=true);
            cube([size[0]-sr2, size[1]-sr2, size[2]], center=true);
        }
        
        for (x=[-1,1]) for (y=[-1,1])
        {
            translate([x*(size[0]/2-smoothRadius), y*(size[1]/2-smoothRadius), smoothRadius])
                sphere(r=smoothRadius, $fn=smoothQuality);
        }
        for (x=[-1,1]) for (y=[-1,1])
        {
            translate([x*(size[0]/2-smoothRadius), y*(size[1]/2-smoothRadius), size[2]-0.01])
                cylinder(r=smoothRadius, h=0.01, $fn=smoothQuality);
        }
        
    }
}

module SmoothCube2(size)
{
    sr2 = smoothRadius*2;
    hull()
    {

        for (x=[-1,1]) for (y=[-1,1])
        {
            translate([x*(size[0]/2-smoothRadius), y*(size[1]/2-smoothRadius), 0])
                cylinder(r=smoothRadius, h=size[2], $fn=smoothQuality);
        }
        
    }
}


module SmoothPanel(size)
{
    hull()
    {
        for (x=[-1,1]) for (z=[-1,1])
            translate([x*(size[0]/2-smoothRadius),0,  z*(size[2]/2-smoothRadius)])
                rotate([-90,0,0]) 
                    cylinder(r=smoothRadius, h=size[1], $fn=smoothQuality);
    }
}

function lerp(v1, v2, a) = (1-a)*v1 + a*v2;
